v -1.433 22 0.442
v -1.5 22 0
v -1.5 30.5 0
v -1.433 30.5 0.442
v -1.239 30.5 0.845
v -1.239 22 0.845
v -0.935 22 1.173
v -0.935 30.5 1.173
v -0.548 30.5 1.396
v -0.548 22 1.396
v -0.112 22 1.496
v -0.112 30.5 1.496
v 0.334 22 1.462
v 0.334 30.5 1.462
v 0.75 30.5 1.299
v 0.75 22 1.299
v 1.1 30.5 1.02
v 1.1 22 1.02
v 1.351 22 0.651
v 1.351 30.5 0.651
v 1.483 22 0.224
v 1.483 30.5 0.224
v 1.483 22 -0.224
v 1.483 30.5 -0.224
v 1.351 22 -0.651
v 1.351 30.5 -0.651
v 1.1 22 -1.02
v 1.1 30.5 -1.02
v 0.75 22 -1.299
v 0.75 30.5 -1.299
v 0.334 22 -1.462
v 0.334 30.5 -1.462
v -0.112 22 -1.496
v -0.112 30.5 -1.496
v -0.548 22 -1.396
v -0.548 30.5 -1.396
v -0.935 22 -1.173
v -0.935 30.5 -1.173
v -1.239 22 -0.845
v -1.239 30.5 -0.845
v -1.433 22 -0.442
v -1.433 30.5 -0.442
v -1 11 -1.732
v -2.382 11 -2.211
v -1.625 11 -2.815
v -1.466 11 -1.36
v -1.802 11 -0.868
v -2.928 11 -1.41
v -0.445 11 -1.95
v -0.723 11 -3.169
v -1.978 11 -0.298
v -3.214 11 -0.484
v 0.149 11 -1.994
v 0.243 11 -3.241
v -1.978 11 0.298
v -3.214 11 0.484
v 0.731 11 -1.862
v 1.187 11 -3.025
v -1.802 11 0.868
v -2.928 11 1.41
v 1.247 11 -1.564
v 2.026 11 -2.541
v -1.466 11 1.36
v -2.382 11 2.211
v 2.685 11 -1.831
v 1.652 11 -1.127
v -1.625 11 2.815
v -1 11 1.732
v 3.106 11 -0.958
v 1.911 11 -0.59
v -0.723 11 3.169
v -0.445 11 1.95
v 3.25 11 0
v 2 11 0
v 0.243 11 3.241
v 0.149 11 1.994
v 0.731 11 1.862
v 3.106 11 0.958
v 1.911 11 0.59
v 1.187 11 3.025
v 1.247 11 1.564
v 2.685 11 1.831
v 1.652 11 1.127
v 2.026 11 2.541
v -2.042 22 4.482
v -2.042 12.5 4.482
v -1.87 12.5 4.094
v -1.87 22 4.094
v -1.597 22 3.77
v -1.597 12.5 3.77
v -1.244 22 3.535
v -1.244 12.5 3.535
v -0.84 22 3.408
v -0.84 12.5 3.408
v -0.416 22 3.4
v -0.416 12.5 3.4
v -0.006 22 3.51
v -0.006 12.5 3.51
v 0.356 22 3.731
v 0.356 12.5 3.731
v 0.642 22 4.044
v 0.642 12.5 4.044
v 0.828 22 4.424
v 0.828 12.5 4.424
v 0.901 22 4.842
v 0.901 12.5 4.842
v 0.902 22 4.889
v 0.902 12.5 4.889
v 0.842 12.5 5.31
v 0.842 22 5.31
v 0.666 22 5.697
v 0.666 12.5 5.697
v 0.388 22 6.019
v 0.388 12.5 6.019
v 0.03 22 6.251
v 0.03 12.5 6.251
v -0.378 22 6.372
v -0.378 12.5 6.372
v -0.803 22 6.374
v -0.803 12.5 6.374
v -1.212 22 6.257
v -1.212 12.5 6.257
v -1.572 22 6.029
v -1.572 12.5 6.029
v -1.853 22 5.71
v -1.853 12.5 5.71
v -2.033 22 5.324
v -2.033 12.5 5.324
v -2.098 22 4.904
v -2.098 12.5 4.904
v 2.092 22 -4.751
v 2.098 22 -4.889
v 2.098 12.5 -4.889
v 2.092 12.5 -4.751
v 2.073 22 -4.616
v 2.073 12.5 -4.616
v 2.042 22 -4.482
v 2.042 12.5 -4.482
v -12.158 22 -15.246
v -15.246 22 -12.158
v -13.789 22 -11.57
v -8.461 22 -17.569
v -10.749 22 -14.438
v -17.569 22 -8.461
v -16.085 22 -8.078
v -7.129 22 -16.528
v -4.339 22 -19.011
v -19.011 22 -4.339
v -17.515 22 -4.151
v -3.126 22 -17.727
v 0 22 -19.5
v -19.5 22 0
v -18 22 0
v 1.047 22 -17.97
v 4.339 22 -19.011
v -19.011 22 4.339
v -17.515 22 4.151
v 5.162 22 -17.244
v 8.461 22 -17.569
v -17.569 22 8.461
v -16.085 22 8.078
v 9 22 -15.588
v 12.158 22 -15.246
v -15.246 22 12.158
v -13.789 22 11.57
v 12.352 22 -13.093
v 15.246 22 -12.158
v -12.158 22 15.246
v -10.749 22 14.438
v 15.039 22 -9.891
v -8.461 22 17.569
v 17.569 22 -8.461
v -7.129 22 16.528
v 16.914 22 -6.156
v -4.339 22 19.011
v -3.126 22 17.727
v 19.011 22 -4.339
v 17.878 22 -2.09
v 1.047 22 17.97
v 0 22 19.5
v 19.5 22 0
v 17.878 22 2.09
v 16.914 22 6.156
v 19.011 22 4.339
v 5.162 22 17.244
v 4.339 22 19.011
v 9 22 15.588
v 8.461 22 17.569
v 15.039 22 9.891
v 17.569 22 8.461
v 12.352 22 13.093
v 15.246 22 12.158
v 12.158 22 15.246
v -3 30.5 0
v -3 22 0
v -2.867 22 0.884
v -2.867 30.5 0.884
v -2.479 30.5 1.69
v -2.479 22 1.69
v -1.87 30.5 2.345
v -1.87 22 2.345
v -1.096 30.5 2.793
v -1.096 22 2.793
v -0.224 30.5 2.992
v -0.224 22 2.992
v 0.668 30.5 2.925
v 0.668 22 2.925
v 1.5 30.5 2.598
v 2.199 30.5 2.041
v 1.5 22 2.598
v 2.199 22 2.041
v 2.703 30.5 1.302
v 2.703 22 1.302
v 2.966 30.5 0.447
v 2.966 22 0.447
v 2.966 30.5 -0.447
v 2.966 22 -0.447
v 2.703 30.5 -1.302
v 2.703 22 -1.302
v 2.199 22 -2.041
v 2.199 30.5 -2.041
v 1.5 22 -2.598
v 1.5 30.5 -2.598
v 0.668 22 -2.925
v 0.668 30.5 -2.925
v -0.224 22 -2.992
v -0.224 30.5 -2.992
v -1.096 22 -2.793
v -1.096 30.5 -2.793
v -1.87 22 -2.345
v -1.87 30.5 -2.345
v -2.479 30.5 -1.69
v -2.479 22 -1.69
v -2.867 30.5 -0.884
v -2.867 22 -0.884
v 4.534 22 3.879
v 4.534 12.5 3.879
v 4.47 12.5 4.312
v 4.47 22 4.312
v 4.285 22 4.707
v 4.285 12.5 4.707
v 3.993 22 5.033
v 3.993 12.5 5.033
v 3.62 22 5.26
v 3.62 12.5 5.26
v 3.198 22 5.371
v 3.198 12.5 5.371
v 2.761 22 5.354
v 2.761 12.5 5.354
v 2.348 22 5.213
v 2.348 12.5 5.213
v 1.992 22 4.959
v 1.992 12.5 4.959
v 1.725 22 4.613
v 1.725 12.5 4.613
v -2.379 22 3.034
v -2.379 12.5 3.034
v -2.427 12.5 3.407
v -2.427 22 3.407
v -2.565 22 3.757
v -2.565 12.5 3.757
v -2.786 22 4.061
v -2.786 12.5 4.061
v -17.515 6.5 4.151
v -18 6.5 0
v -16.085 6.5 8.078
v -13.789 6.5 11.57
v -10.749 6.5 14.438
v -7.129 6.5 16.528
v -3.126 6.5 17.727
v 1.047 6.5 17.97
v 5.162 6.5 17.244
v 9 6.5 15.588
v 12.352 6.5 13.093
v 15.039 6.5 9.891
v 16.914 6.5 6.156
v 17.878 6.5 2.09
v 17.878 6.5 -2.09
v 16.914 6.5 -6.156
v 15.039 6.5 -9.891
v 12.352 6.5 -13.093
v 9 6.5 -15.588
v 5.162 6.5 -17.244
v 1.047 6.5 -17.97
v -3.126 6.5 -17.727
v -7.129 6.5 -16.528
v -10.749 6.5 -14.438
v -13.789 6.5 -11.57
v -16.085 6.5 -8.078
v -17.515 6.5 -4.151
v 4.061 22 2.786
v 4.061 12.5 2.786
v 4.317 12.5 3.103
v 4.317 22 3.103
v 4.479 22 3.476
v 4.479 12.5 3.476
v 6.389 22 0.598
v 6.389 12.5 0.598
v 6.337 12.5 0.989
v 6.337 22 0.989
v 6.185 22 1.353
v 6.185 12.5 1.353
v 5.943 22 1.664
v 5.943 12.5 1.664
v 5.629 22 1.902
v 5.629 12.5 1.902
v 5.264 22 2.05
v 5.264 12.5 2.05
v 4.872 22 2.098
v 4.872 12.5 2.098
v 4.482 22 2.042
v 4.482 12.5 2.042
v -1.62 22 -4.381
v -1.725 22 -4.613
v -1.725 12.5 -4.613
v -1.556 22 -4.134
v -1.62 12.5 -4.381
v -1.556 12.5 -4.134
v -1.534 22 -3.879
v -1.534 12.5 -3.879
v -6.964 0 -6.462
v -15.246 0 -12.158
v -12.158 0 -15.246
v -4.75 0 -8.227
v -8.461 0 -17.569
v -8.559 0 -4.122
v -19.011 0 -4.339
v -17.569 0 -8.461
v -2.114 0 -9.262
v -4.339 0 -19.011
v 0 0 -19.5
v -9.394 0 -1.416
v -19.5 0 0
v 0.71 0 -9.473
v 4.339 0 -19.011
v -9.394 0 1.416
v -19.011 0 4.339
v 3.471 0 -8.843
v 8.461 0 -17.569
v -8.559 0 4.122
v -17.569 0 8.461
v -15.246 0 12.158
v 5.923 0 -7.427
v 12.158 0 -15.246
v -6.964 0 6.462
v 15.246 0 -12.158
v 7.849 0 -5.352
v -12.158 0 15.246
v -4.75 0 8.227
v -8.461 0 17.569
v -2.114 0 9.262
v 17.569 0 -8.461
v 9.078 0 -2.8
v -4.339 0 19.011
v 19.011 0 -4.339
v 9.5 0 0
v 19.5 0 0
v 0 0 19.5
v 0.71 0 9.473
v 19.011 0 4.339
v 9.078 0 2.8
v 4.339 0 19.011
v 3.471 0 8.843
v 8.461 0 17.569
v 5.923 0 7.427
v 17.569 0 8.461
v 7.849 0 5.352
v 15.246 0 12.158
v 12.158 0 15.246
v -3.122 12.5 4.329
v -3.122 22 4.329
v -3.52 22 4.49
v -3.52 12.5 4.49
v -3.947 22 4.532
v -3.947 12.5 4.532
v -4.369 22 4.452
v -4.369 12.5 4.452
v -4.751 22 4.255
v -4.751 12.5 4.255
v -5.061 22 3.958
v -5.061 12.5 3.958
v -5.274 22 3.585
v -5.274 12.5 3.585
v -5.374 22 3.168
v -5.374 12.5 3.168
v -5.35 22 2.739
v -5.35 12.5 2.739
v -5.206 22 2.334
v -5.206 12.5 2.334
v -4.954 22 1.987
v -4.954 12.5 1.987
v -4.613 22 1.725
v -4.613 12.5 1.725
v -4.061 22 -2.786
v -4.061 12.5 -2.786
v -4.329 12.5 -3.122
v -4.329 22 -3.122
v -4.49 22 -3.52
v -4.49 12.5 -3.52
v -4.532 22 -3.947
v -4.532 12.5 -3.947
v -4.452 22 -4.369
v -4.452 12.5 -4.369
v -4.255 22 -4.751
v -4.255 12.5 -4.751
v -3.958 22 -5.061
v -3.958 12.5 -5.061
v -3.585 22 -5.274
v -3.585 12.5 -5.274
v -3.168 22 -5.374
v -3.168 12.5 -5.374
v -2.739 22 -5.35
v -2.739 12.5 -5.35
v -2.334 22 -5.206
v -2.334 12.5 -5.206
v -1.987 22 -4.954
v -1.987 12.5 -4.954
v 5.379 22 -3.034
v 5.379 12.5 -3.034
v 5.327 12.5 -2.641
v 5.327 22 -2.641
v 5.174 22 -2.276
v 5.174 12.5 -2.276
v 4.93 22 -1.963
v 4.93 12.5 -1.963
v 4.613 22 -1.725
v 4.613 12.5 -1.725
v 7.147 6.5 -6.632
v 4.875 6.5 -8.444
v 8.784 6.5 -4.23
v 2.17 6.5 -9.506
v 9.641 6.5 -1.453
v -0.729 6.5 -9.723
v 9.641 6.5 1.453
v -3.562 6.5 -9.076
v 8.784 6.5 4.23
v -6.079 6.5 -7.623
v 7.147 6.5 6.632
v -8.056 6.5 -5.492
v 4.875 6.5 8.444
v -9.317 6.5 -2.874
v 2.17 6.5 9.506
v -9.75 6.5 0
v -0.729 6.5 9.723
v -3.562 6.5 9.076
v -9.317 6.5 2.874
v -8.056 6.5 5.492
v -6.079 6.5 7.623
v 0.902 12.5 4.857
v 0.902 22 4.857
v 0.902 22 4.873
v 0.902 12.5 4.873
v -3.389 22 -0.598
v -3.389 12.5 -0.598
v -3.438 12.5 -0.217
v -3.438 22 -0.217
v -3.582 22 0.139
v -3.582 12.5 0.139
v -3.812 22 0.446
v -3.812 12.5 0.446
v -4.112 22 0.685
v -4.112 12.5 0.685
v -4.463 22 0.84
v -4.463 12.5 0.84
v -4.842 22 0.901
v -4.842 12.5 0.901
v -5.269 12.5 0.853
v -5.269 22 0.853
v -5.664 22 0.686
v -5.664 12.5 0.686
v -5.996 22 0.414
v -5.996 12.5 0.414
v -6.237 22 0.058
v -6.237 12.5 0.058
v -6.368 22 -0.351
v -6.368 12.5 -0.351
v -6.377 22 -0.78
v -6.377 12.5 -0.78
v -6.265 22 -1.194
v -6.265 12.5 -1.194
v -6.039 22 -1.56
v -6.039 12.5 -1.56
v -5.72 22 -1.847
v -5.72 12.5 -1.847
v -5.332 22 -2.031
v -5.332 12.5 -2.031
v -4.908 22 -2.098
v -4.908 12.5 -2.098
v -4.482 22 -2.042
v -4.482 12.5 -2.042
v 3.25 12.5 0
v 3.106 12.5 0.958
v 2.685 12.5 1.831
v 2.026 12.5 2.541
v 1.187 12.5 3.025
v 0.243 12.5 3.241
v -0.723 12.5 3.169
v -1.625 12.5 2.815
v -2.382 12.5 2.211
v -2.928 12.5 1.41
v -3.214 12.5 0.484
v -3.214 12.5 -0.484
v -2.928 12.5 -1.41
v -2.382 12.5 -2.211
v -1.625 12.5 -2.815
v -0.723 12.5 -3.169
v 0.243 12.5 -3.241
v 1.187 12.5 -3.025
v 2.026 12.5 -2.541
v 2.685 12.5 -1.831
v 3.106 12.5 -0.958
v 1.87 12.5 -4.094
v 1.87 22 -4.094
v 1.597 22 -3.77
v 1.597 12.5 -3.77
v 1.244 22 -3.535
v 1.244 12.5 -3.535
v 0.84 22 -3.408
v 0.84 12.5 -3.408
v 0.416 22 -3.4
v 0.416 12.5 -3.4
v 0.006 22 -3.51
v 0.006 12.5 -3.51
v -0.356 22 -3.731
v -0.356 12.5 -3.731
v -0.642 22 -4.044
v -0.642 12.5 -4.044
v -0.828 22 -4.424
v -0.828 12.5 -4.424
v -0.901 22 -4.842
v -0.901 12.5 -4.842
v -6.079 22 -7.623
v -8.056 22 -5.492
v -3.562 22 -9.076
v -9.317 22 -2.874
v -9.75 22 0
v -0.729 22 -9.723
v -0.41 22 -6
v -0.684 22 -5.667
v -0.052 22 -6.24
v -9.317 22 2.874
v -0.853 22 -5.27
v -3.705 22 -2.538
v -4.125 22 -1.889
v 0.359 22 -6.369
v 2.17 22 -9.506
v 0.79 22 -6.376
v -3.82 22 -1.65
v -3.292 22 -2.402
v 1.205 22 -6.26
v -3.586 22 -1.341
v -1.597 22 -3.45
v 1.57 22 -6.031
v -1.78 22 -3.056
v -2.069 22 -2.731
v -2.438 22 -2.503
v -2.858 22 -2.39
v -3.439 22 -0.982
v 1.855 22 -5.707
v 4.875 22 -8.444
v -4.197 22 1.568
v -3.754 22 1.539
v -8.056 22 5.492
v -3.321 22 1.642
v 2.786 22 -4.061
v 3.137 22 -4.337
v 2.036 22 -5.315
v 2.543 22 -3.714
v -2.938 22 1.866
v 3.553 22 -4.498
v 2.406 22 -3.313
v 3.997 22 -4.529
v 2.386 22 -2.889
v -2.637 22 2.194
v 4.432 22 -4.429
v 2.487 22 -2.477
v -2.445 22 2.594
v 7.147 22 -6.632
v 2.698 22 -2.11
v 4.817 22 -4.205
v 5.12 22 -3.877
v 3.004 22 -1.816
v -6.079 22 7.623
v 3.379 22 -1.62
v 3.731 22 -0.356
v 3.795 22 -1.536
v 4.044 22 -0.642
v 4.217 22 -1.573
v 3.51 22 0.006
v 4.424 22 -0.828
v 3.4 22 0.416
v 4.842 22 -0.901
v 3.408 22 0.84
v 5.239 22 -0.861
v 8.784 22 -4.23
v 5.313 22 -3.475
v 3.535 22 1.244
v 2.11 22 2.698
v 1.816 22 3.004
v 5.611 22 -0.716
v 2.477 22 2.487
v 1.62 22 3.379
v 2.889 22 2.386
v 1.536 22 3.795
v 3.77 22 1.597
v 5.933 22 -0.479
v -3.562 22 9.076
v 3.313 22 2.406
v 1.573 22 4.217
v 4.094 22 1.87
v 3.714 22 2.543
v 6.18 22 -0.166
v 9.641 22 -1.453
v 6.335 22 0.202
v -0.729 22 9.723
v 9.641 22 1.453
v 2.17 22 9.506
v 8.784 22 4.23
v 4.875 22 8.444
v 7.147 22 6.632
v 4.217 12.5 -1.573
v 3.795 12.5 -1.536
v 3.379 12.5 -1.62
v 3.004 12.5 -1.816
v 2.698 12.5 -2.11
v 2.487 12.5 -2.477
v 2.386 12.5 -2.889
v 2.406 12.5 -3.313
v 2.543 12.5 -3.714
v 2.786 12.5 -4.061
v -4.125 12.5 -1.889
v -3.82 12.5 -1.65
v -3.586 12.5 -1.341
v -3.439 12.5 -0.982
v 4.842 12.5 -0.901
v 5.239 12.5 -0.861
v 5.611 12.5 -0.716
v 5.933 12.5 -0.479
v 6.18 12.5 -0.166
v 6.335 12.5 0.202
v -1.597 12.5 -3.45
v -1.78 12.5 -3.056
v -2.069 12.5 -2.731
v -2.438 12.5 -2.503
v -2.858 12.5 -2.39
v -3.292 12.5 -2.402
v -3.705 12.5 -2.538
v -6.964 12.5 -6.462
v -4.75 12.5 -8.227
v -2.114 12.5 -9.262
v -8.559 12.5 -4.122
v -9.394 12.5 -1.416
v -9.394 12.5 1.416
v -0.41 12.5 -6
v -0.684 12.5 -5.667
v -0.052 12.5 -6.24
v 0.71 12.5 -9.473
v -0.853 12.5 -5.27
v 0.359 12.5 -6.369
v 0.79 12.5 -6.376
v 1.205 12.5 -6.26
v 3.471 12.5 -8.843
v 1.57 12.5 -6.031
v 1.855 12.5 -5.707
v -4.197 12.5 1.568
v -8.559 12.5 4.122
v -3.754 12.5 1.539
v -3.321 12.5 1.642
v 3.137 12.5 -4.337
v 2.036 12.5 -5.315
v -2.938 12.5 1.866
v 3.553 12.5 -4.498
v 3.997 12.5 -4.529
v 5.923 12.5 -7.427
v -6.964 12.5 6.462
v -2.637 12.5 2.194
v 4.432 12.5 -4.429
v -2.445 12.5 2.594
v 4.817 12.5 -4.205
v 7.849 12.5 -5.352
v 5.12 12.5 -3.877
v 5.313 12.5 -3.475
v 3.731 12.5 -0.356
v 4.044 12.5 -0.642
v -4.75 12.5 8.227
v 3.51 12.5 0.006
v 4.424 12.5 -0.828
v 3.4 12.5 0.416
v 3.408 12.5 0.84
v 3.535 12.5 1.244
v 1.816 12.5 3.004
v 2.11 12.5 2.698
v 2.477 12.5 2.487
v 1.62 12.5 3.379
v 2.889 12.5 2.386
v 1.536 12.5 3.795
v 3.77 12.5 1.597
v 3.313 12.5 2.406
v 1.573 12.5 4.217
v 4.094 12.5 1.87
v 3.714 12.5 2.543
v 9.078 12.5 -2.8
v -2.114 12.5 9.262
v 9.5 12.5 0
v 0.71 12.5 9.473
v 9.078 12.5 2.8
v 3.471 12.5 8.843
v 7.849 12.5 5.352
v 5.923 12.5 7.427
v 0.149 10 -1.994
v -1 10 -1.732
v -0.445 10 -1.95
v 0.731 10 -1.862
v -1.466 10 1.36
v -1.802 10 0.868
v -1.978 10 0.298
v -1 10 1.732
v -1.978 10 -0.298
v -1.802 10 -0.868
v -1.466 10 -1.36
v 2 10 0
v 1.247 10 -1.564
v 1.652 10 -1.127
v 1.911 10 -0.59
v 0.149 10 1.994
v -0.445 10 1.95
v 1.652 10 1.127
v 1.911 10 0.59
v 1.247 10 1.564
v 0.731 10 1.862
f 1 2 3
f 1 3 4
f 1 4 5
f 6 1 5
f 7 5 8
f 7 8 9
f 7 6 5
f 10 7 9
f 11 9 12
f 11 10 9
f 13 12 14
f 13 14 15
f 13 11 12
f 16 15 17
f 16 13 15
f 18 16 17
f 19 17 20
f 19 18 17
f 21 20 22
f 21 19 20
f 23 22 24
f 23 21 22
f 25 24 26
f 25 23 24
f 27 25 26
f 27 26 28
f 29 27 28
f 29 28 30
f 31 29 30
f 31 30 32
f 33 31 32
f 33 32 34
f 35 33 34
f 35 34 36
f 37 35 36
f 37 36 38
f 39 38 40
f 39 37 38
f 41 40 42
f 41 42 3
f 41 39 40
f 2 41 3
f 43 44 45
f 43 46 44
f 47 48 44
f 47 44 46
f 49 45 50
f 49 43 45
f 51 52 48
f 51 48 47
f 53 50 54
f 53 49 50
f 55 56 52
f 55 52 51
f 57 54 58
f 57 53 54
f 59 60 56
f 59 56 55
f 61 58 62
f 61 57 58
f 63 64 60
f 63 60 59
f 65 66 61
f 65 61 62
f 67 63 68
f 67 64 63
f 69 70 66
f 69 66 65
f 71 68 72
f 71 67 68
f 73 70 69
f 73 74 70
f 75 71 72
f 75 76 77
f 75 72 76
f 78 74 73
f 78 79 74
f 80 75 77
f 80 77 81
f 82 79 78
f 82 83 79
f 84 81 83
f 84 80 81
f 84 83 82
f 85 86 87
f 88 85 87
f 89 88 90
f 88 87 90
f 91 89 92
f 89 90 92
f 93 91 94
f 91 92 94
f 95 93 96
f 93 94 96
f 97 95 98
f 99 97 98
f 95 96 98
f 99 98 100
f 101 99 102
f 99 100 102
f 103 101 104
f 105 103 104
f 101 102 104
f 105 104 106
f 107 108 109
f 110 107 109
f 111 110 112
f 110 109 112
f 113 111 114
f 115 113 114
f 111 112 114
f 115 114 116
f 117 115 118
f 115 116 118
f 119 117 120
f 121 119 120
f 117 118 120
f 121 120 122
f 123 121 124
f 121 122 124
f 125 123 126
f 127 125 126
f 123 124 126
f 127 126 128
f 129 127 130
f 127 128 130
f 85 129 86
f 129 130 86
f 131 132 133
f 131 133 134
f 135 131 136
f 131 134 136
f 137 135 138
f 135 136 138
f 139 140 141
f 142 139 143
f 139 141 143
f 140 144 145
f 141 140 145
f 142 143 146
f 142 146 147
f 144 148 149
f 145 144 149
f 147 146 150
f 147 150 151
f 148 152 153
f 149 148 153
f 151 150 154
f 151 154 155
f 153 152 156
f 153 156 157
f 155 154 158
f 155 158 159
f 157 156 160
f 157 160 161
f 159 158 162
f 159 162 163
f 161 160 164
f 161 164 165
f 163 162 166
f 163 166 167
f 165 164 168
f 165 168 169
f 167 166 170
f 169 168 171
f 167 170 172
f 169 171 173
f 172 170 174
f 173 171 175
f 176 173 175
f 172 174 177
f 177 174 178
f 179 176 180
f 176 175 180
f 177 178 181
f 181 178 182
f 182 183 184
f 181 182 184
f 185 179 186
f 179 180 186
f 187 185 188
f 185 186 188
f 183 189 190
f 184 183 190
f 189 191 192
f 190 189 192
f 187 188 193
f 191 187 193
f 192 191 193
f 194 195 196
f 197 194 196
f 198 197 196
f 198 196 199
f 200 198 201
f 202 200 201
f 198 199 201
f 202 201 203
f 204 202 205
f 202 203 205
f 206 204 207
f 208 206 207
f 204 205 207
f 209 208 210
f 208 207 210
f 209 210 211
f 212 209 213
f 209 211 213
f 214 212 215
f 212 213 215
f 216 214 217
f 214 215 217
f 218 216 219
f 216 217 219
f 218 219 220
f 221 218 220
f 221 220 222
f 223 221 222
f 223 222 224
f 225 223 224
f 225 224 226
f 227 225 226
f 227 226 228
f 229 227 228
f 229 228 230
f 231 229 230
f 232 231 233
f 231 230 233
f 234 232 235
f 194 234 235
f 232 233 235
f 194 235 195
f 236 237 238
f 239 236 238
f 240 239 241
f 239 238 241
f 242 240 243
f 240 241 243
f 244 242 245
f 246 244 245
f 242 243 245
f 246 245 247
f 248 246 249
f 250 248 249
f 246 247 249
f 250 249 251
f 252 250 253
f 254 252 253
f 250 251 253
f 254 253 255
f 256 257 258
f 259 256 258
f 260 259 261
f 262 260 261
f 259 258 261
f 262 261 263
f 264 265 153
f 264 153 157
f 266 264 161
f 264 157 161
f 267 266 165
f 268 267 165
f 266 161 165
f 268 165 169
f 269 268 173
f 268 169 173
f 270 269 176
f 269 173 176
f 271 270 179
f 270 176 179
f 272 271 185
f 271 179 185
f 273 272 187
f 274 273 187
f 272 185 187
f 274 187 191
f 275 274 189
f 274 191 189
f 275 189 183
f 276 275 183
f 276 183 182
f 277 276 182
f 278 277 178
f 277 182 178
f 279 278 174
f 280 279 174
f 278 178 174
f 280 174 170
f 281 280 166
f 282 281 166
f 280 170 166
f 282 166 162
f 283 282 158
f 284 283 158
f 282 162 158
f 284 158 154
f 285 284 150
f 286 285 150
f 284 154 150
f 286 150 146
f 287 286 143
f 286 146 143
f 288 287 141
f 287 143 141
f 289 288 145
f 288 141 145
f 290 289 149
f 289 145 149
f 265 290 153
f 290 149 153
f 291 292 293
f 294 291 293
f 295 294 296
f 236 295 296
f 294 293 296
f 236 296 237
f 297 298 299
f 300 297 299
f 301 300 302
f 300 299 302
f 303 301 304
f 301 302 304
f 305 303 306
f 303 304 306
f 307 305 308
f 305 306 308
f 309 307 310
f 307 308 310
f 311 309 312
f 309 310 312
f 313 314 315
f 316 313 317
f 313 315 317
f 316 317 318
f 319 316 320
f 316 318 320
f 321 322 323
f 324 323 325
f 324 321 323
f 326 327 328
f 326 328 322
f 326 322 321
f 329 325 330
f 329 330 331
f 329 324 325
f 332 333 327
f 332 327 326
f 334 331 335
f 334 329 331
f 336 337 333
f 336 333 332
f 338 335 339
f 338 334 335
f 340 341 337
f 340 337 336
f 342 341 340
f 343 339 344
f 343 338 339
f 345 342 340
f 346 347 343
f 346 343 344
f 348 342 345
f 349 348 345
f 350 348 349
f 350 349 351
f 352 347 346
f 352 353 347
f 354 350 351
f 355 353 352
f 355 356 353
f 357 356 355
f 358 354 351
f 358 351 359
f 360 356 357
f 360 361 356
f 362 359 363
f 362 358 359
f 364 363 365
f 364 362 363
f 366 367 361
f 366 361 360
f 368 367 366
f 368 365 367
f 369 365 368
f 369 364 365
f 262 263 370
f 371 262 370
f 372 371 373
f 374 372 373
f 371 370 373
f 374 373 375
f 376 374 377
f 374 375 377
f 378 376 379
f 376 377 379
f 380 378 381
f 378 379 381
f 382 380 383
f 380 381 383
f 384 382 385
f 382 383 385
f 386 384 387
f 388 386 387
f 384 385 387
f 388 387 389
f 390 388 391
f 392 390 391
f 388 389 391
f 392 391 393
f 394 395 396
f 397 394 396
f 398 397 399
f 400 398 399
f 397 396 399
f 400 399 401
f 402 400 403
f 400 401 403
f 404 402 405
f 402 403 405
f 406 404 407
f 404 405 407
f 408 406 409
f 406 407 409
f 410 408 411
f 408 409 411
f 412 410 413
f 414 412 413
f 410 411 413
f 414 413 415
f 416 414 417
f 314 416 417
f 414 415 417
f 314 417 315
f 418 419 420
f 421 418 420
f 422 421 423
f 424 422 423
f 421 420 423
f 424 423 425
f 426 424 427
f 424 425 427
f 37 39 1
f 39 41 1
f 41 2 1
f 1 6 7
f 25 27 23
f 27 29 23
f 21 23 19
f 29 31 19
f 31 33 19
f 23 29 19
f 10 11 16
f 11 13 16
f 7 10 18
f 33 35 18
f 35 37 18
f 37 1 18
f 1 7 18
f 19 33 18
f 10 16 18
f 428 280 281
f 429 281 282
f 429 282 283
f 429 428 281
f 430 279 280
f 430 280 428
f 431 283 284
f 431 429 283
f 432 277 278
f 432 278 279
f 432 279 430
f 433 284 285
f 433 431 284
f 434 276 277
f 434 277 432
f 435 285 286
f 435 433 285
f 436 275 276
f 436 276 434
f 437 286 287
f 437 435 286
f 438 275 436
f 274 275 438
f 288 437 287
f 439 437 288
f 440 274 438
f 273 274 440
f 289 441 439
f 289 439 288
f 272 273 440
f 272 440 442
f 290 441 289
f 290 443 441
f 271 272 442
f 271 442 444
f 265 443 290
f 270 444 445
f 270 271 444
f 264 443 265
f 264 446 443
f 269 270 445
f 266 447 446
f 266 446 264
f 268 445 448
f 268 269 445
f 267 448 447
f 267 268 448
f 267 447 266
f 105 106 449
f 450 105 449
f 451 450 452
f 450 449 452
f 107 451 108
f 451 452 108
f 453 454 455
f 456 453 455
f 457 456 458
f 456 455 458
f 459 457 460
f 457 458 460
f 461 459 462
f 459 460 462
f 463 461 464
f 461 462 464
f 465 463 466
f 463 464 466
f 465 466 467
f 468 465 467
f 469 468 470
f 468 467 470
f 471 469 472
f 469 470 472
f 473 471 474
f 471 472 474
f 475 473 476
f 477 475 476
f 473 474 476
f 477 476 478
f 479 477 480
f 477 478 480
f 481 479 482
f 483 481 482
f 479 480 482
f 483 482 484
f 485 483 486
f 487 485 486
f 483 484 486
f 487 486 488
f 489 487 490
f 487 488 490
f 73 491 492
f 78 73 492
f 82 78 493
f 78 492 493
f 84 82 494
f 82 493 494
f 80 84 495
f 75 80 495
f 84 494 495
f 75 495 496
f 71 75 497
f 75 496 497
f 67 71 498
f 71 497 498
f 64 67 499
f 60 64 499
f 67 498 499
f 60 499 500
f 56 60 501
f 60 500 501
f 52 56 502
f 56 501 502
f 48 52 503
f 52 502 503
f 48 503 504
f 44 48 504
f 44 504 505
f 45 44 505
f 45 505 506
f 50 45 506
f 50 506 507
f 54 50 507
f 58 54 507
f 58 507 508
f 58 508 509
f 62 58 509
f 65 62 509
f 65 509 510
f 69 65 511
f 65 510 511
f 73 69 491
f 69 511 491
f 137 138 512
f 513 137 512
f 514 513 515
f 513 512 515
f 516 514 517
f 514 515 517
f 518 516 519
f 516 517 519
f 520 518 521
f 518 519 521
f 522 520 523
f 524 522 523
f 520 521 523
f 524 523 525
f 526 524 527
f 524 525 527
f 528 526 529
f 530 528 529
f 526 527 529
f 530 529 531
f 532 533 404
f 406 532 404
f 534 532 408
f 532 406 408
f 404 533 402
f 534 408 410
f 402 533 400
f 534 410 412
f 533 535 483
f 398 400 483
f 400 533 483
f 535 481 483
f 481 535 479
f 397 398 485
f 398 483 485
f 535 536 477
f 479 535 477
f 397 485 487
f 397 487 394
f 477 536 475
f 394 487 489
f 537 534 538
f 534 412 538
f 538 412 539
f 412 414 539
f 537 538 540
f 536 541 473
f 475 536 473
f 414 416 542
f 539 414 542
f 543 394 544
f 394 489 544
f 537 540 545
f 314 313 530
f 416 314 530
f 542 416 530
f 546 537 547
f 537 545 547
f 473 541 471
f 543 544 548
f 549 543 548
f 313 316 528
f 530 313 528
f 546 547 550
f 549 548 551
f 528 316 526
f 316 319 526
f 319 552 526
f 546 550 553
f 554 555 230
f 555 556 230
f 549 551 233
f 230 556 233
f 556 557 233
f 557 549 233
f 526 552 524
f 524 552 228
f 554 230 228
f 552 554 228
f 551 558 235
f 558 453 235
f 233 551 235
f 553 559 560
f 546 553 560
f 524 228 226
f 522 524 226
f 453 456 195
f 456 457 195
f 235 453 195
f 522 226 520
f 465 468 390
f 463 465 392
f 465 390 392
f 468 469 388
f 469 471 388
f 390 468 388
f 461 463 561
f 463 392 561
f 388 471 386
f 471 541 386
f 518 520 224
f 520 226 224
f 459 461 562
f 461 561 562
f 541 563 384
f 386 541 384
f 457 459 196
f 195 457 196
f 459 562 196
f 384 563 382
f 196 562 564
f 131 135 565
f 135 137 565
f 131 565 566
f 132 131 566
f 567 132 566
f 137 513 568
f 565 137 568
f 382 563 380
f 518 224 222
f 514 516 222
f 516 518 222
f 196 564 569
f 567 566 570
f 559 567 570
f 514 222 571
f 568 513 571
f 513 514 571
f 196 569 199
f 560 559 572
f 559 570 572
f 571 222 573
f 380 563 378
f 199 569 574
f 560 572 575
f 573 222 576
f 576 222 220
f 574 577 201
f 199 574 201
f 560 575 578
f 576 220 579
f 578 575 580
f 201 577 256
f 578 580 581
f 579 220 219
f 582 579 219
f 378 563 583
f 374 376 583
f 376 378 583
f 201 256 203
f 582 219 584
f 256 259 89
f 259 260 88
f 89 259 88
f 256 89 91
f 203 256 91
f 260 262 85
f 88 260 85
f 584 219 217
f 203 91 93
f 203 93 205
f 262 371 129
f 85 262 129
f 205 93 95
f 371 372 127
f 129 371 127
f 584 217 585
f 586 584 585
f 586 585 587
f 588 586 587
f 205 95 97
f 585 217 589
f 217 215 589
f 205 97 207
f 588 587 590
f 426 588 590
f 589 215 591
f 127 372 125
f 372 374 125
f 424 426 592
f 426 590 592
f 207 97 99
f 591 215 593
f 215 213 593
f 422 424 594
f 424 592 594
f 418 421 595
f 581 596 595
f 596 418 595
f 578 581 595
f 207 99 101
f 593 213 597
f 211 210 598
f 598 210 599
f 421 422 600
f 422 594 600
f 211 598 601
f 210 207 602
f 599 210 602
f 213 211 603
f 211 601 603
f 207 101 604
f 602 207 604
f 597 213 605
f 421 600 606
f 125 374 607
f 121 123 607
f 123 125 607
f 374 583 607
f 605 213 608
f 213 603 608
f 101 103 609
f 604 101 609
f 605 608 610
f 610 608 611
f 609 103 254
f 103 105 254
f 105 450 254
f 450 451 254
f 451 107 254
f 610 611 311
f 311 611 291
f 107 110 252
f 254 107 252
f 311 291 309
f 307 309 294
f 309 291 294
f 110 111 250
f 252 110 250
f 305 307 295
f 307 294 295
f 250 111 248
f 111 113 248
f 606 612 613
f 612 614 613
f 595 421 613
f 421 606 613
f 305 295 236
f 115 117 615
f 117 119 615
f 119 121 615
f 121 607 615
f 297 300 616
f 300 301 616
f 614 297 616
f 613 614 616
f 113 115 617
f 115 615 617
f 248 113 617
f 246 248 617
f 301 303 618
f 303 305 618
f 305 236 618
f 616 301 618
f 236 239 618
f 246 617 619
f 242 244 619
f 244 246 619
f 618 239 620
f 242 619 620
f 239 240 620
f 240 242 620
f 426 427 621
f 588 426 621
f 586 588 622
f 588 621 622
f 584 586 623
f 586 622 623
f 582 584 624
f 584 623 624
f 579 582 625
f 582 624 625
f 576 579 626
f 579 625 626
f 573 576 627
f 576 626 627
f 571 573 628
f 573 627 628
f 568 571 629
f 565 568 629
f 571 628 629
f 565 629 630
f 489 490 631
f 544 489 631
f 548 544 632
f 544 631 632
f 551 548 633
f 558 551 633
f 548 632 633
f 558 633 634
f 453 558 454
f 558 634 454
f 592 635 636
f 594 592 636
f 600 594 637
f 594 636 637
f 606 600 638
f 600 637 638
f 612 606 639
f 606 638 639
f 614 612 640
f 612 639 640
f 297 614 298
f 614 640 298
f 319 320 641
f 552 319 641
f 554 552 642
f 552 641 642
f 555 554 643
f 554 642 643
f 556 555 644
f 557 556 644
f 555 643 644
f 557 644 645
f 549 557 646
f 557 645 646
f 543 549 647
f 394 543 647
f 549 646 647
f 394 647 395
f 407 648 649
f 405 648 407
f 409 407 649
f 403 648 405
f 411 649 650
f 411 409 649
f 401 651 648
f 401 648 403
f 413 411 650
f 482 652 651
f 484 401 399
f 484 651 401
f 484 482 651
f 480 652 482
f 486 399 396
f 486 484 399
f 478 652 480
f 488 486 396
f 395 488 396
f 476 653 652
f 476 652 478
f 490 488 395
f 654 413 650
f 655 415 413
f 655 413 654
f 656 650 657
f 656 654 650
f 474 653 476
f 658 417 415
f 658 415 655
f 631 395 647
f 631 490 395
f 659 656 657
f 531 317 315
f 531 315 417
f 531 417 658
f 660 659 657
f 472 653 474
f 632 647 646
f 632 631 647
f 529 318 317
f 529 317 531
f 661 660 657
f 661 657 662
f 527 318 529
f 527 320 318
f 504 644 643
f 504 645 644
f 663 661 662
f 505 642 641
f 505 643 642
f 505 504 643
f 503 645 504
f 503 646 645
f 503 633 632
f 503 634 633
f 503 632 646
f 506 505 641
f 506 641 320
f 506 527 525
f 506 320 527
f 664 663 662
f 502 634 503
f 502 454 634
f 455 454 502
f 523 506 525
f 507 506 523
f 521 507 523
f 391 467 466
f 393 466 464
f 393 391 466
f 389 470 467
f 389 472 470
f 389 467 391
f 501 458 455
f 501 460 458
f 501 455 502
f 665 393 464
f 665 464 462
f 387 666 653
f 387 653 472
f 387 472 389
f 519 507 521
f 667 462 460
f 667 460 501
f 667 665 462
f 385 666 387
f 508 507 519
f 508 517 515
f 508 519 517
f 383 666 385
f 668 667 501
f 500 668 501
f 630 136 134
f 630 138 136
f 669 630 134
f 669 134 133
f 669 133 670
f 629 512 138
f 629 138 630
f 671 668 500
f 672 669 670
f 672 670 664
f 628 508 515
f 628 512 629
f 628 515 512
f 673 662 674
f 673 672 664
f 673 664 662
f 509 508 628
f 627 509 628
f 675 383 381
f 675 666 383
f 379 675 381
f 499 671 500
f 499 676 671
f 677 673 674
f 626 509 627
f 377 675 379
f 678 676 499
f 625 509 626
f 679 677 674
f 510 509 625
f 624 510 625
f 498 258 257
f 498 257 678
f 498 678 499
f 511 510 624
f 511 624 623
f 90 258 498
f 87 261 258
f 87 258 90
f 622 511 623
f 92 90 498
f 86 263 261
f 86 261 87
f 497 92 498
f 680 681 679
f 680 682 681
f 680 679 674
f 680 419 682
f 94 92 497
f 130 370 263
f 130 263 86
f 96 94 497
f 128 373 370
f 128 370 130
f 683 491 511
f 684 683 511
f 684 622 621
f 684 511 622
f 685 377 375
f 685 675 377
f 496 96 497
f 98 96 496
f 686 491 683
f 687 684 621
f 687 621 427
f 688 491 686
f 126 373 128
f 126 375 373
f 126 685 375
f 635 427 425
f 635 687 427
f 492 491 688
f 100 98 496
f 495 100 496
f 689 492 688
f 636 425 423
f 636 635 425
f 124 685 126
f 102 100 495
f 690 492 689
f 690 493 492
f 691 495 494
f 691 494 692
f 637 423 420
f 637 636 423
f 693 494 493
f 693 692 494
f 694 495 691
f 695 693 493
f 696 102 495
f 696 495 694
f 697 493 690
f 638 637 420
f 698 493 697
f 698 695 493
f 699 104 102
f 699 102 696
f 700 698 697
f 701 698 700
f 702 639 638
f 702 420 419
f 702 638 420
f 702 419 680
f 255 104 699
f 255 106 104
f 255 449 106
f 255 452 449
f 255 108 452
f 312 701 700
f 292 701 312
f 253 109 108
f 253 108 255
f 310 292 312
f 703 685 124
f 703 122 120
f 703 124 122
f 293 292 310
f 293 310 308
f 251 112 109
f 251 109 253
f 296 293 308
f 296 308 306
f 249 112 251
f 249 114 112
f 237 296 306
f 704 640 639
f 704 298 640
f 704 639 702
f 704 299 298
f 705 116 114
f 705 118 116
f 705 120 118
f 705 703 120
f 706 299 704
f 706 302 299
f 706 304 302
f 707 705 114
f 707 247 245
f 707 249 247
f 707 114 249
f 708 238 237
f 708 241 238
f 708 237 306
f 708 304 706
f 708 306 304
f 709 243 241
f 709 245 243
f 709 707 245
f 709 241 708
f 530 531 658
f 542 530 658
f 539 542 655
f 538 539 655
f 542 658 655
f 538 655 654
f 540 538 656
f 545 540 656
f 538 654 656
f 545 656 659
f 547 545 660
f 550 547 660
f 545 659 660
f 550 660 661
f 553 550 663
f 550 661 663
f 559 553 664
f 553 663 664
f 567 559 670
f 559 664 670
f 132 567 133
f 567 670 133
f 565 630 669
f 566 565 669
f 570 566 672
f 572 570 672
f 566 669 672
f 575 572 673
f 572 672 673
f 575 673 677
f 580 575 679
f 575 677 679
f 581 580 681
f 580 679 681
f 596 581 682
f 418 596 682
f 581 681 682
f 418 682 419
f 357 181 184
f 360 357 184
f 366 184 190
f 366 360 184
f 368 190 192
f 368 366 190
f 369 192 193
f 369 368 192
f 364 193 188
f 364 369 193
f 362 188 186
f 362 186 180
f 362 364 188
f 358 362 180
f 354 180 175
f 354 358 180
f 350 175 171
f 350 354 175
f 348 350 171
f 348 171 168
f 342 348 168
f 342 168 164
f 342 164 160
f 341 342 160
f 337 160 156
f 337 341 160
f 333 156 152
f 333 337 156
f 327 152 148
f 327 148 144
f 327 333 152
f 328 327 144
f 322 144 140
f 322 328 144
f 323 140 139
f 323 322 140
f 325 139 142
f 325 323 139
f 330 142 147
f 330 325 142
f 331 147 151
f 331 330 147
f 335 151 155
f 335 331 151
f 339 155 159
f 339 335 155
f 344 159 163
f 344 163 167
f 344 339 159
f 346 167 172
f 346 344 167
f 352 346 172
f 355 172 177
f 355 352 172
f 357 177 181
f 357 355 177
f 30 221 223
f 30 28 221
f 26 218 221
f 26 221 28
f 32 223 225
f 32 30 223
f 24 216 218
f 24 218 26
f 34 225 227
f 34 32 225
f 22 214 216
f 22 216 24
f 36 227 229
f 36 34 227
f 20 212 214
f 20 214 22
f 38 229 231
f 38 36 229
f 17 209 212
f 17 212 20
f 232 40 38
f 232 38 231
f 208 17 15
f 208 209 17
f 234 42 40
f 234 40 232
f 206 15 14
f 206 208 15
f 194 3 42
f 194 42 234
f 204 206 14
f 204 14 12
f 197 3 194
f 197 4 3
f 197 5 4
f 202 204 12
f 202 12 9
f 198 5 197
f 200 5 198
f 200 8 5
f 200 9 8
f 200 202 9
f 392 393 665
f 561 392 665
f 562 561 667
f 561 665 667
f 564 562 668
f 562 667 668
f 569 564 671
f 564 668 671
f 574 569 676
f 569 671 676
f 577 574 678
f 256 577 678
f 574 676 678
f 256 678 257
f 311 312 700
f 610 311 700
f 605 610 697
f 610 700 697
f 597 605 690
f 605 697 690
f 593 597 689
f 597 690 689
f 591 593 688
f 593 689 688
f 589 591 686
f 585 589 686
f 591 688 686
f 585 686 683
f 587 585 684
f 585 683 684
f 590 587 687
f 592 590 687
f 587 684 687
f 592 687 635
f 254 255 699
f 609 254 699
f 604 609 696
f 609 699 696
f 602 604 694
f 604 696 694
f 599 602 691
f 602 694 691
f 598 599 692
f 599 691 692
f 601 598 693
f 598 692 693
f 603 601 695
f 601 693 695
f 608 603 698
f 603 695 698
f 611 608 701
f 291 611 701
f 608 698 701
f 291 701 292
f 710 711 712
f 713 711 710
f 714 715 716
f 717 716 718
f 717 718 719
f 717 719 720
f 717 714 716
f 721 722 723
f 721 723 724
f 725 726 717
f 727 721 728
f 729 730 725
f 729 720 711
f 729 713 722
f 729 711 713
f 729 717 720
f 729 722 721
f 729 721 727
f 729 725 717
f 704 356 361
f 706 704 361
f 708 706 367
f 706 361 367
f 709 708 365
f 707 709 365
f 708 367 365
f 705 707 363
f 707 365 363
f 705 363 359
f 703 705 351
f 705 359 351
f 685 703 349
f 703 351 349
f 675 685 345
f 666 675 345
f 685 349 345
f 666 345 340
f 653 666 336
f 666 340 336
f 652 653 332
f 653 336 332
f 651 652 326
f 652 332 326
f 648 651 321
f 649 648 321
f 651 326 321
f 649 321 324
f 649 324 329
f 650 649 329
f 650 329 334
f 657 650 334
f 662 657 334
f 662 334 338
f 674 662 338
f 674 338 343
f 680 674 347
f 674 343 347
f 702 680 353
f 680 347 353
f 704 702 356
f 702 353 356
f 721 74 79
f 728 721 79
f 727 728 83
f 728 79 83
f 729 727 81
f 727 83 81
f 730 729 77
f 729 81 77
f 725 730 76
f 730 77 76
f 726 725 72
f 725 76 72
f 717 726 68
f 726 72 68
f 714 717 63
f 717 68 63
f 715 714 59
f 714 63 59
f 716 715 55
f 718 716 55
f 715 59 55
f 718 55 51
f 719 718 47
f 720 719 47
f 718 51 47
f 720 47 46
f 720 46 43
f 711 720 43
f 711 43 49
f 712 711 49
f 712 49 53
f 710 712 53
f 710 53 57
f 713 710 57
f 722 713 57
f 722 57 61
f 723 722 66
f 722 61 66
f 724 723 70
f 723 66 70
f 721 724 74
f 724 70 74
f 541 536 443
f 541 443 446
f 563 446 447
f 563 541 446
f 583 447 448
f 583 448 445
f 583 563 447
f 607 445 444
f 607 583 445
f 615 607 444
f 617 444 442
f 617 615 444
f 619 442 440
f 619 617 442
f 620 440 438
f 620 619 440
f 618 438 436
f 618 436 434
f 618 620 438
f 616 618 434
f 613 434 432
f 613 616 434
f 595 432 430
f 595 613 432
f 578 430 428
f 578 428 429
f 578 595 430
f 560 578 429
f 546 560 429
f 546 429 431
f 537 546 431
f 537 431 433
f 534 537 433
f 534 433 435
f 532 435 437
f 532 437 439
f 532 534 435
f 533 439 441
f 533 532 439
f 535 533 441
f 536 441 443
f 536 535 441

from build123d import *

# Parameters (mm, degrees)
F0_R      = 19.5
F0_R_2    = 9.5
F1_DEPTH  = 22
F2_DEPTH  = 12.5
F4_DEPTH  = 25.4
F5_R      = 3
F5_R_2    = 1.5
F6_DEPTH  = 8.5
F7_R      = 18
F7_R_2    = 9.75
F8_DEPTH  = 15.5
F9_R      = 3.25
F10_DEPTH = 1.5
F11_R     = 2
F12_DEPTH = 1


with BuildPart() as f1:
    # F0 (on Front) → F1 (new body)
    with BuildSketch(Plane.XZ):
        Circle(F0_R)
        Circle(F0_R_2, mode=Mode.SUBTRACT)
        Circle(F0_R_2)
    extrude(amount=-F1_DEPTH)

    # F0 (on Front) → F2 (cut)
    with BuildSketch(Plane.XZ):
        Circle(F0_R_2)
    extrude(amount=-F2_DEPTH, mode=Mode.SUBTRACT)

    # F3 (on face) → F4 (cut)
    with BuildSketch(Plane.XZ.offset(-12.5)):
        with BuildLine():
            ThreePointArc((1.725492364, 4.6128408927), (2.1099407886, 2.6979204712), (4.0610724324, 2.7862727252))
            ThreePointArc((4.0610724324, 2.7862727252), (3.0340024478, 3.8794914804), (1.725492364, 4.6128408927))
        make_face()
        with BuildLine():
            ThreePointArc((1.725492364, 4.6128408927), (3.0340024478, 3.8794914804), (4.0610724324, 2.7862727252))
            ThreePointArc((4.0610724324, 2.7862727252), (4.410702302, 3.2839266128), (4.5340024478, 3.8794914804))
            ThreePointArc((4.5340024478, 3.8794914804), (3.412971361, 5.3308296777), (1.725492364, 4.6128408927))
        make_face()
        with BuildLine():
            ThreePointArc((-2.0416637243, 4.4818784273), (-0.4157644207, 3.3996712998), (0.9014195176, 4.841804194))
            ThreePointArc((0.9014195176, 4.841804194), (-0.5978510284, 4.8885784383), (-2.0416637243, 4.4818784273))
        make_face()
        with BuildLine():
            ThreePointArc((-2.0416637243, 4.4818784273), (-0.5978510284, 4.8885784383), (0.9014195176, 4.841804194))
            ThreePointArc((0.9014195176, 4.841804194), (0.901966597, 4.8651884724), (0.9021489716, 4.8885784383))
            ThreePointArc((0.9021489716, 4.8885784383), (-0.8031324889, 6.374465218), (-2.0416637243, 4.4818784273))
        make_face()
        with BuildLine():
            ThreePointArc((-2.3794914804, 3.0340024478), (-2.4848897213, 3.5863482938), (-2.7862727252, 4.0610724324))
            ThreePointArc((-2.7862727252, 4.0610724324), (-3.8794914804, 3.0340024478), (-4.6128408927, 1.725492364))
            ThreePointArc((-4.6128408927, 1.725492364), (-3.1212118877, 1.7397798784), (-2.3794914804, 3.0340024478))
        make_face()
        with BuildLine():
            ThreePointArc((-4.6128408927, 1.725492364), (-3.8794914804, 3.0340024478), (-2.7862727252, 4.0610724324))
            ThreePointArc((-2.7862727252, 4.0610724324), (-5.0610624897, 3.9580641071), (-4.6128408927, 1.725492364))
        make_face()
        with BuildLine():
            ThreePointArc((-3.3885784383, -0.5978510284), (-3.8115080213, 0.4461409815), (-4.841804194, 0.9014195176))
            ThreePointArc((-4.841804194, 0.9014195176), (-4.8885784383, -0.5978510284), (-4.4818784273, -2.0416637243))
            ThreePointArc((-4.4818784273, -2.0416637243), (-3.6927419076, -1.5033757335), (-3.3885784383, -0.5978510284))
        make_face()
        with BuildLine():
            ThreePointArc((-4.4818784273, -2.0416637243), (-4.8885784383, -0.5978510284), (-4.841804194, 0.9014195176))
            ThreePointArc((-4.841804194, 0.9014195176), (-6.3774855769, -0.779937636), (-4.4818784273, -2.0416637243))
        make_face()
        with BuildLine():
            ThreePointArc((-4.0610724324, -2.7862727252), (-3.0340024478, -3.8794914804), (-1.725492364, -4.6128408927))
            ThreePointArc((-1.725492364, -4.6128408927), (-1.5826642505, -4.2584603936), (-1.5340024478, -3.8794914804))
            ThreePointArc((-1.5340024478, -3.8794914804), (-2.4384375802, -2.5027916263), (-4.0610724324, -2.7862727252))
        make_face()
        with BuildLine():
            ThreePointArc((-4.0610724324, -2.7862727252), (-3.9580641071, -5.0610624897), (-1.725492364, -4.6128408927))
            ThreePointArc((-1.725492364, -4.6128408927), (-3.0340024478, -3.8794914804), (-4.0610724324, -2.7862727252))
        make_face()
        with BuildLine():
            ThreePointArc((-0.9014195176, -4.841804194), (0.5978510284, -4.8885784383), (2.0416637243, -4.4818784273))
            ThreePointArc((2.0416637243, -4.4818784273), (0.4157644207, -3.3996712998), (-0.9014195176, -4.841804194))
        make_face()
        with BuildLine():
            ThreePointArc((2.0978510284, -4.8885784383), (2.083737808, -4.6832969778), (2.0416637243, -4.4818784273))
            ThreePointArc((2.0416637243, -4.4818784273), (0.5978510284, -4.8885784383), (-0.9014195176, -4.841804194))
            ThreePointArc((-0.9014195176, -4.841804194), (0.5744610624, -6.3883960638), (2.0978510284, -4.8885784383))
        make_face()
        with BuildLine():
            ThreePointArc((2.7862727252, -4.0610724324), (3.8794914804, -3.0340024478), (4.6128408927, -1.725492364))
            ThreePointArc((4.6128408927, -1.725492364), (2.6979204712, -2.1099407886), (2.7862727252, -4.0610724324))
        make_face()
        with BuildLine():
            ThreePointArc((5.3794914804, -3.0340024478), (5.1737140499, -2.2757228551), (4.6128408927, -1.725492364))
            ThreePointArc((4.6128408927, -1.725492364), (3.8794914804, -3.0340024478), (2.7862727252, -4.0610724324))
            ThreePointArc((2.7862727252, -4.0610724324), (4.4318373264, -4.4286042069), (5.3794914804, -3.0340024478))
        make_face()
        with BuildLine():
            ThreePointArc((4.841804194, -0.9014195176), (4.9041569436, -0.4526253111), (4.925, 0))
            ThreePointArc((4.925, 0), (4.8129448498, 1.0445989053), (4.4818784273, 2.0416637243))
            ThreePointArc((4.4818784273, 2.0416637243), (3.3996712998, 0.4157644207), (4.841804194, -0.9014195176))
        make_face()
        with BuildLine():
            ThreePointArc((4.4818784273, 2.0416637243), (4.8129448498, 1.0445989053), (4.925, 0))
            ThreePointArc((4.925, 0), (4.9041569436, -0.4526253111), (4.841804194, -0.9014195176))
            ThreePointArc((4.841804194, -0.9014195176), (5.9325704483, -0.4792193887), (6.3885784383, 0.5978510284))
            ThreePointArc((6.3885784383, 0.5978510284), (5.7941031435, 1.7936875591), (4.4818784273, 2.0416637243))
        make_face()
    extrude(amount=-F4_DEPTH, mode=Mode.SUBTRACT)

    # F5 (on face) → F6 (join)
    with BuildSketch(Plane(origin=(0, 22, 0), x_dir=(-1, 0, 0), z_dir=(0, 1, 0))):
        Circle(F5_R)
        Circle(F5_R_2, mode=Mode.SUBTRACT)
    extrude(amount=F6_DEPTH)

    # F7 (on face) → F8 (cut)
    with BuildSketch(Plane(origin=(0, 22, 0), x_dir=(-1, 0, 0), z_dir=(0, 1, 0))):
        Circle(F7_R)
        Circle(F7_R_2, mode=Mode.SUBTRACT)
    extrude(amount=-F8_DEPTH, mode=Mode.SUBTRACT)

    # F9 (on face) → F10 (join)
    with BuildSketch(Plane.XZ.offset(-12.5)):
        Circle(F9_R)
    extrude(amount=F10_DEPTH)

    # F11 (on face) → F12 (join)
    with BuildSketch(Plane.XZ.offset(-11)):
        Circle(F11_R)
    extrude(amount=F12_DEPTH)


solid = f1.part
